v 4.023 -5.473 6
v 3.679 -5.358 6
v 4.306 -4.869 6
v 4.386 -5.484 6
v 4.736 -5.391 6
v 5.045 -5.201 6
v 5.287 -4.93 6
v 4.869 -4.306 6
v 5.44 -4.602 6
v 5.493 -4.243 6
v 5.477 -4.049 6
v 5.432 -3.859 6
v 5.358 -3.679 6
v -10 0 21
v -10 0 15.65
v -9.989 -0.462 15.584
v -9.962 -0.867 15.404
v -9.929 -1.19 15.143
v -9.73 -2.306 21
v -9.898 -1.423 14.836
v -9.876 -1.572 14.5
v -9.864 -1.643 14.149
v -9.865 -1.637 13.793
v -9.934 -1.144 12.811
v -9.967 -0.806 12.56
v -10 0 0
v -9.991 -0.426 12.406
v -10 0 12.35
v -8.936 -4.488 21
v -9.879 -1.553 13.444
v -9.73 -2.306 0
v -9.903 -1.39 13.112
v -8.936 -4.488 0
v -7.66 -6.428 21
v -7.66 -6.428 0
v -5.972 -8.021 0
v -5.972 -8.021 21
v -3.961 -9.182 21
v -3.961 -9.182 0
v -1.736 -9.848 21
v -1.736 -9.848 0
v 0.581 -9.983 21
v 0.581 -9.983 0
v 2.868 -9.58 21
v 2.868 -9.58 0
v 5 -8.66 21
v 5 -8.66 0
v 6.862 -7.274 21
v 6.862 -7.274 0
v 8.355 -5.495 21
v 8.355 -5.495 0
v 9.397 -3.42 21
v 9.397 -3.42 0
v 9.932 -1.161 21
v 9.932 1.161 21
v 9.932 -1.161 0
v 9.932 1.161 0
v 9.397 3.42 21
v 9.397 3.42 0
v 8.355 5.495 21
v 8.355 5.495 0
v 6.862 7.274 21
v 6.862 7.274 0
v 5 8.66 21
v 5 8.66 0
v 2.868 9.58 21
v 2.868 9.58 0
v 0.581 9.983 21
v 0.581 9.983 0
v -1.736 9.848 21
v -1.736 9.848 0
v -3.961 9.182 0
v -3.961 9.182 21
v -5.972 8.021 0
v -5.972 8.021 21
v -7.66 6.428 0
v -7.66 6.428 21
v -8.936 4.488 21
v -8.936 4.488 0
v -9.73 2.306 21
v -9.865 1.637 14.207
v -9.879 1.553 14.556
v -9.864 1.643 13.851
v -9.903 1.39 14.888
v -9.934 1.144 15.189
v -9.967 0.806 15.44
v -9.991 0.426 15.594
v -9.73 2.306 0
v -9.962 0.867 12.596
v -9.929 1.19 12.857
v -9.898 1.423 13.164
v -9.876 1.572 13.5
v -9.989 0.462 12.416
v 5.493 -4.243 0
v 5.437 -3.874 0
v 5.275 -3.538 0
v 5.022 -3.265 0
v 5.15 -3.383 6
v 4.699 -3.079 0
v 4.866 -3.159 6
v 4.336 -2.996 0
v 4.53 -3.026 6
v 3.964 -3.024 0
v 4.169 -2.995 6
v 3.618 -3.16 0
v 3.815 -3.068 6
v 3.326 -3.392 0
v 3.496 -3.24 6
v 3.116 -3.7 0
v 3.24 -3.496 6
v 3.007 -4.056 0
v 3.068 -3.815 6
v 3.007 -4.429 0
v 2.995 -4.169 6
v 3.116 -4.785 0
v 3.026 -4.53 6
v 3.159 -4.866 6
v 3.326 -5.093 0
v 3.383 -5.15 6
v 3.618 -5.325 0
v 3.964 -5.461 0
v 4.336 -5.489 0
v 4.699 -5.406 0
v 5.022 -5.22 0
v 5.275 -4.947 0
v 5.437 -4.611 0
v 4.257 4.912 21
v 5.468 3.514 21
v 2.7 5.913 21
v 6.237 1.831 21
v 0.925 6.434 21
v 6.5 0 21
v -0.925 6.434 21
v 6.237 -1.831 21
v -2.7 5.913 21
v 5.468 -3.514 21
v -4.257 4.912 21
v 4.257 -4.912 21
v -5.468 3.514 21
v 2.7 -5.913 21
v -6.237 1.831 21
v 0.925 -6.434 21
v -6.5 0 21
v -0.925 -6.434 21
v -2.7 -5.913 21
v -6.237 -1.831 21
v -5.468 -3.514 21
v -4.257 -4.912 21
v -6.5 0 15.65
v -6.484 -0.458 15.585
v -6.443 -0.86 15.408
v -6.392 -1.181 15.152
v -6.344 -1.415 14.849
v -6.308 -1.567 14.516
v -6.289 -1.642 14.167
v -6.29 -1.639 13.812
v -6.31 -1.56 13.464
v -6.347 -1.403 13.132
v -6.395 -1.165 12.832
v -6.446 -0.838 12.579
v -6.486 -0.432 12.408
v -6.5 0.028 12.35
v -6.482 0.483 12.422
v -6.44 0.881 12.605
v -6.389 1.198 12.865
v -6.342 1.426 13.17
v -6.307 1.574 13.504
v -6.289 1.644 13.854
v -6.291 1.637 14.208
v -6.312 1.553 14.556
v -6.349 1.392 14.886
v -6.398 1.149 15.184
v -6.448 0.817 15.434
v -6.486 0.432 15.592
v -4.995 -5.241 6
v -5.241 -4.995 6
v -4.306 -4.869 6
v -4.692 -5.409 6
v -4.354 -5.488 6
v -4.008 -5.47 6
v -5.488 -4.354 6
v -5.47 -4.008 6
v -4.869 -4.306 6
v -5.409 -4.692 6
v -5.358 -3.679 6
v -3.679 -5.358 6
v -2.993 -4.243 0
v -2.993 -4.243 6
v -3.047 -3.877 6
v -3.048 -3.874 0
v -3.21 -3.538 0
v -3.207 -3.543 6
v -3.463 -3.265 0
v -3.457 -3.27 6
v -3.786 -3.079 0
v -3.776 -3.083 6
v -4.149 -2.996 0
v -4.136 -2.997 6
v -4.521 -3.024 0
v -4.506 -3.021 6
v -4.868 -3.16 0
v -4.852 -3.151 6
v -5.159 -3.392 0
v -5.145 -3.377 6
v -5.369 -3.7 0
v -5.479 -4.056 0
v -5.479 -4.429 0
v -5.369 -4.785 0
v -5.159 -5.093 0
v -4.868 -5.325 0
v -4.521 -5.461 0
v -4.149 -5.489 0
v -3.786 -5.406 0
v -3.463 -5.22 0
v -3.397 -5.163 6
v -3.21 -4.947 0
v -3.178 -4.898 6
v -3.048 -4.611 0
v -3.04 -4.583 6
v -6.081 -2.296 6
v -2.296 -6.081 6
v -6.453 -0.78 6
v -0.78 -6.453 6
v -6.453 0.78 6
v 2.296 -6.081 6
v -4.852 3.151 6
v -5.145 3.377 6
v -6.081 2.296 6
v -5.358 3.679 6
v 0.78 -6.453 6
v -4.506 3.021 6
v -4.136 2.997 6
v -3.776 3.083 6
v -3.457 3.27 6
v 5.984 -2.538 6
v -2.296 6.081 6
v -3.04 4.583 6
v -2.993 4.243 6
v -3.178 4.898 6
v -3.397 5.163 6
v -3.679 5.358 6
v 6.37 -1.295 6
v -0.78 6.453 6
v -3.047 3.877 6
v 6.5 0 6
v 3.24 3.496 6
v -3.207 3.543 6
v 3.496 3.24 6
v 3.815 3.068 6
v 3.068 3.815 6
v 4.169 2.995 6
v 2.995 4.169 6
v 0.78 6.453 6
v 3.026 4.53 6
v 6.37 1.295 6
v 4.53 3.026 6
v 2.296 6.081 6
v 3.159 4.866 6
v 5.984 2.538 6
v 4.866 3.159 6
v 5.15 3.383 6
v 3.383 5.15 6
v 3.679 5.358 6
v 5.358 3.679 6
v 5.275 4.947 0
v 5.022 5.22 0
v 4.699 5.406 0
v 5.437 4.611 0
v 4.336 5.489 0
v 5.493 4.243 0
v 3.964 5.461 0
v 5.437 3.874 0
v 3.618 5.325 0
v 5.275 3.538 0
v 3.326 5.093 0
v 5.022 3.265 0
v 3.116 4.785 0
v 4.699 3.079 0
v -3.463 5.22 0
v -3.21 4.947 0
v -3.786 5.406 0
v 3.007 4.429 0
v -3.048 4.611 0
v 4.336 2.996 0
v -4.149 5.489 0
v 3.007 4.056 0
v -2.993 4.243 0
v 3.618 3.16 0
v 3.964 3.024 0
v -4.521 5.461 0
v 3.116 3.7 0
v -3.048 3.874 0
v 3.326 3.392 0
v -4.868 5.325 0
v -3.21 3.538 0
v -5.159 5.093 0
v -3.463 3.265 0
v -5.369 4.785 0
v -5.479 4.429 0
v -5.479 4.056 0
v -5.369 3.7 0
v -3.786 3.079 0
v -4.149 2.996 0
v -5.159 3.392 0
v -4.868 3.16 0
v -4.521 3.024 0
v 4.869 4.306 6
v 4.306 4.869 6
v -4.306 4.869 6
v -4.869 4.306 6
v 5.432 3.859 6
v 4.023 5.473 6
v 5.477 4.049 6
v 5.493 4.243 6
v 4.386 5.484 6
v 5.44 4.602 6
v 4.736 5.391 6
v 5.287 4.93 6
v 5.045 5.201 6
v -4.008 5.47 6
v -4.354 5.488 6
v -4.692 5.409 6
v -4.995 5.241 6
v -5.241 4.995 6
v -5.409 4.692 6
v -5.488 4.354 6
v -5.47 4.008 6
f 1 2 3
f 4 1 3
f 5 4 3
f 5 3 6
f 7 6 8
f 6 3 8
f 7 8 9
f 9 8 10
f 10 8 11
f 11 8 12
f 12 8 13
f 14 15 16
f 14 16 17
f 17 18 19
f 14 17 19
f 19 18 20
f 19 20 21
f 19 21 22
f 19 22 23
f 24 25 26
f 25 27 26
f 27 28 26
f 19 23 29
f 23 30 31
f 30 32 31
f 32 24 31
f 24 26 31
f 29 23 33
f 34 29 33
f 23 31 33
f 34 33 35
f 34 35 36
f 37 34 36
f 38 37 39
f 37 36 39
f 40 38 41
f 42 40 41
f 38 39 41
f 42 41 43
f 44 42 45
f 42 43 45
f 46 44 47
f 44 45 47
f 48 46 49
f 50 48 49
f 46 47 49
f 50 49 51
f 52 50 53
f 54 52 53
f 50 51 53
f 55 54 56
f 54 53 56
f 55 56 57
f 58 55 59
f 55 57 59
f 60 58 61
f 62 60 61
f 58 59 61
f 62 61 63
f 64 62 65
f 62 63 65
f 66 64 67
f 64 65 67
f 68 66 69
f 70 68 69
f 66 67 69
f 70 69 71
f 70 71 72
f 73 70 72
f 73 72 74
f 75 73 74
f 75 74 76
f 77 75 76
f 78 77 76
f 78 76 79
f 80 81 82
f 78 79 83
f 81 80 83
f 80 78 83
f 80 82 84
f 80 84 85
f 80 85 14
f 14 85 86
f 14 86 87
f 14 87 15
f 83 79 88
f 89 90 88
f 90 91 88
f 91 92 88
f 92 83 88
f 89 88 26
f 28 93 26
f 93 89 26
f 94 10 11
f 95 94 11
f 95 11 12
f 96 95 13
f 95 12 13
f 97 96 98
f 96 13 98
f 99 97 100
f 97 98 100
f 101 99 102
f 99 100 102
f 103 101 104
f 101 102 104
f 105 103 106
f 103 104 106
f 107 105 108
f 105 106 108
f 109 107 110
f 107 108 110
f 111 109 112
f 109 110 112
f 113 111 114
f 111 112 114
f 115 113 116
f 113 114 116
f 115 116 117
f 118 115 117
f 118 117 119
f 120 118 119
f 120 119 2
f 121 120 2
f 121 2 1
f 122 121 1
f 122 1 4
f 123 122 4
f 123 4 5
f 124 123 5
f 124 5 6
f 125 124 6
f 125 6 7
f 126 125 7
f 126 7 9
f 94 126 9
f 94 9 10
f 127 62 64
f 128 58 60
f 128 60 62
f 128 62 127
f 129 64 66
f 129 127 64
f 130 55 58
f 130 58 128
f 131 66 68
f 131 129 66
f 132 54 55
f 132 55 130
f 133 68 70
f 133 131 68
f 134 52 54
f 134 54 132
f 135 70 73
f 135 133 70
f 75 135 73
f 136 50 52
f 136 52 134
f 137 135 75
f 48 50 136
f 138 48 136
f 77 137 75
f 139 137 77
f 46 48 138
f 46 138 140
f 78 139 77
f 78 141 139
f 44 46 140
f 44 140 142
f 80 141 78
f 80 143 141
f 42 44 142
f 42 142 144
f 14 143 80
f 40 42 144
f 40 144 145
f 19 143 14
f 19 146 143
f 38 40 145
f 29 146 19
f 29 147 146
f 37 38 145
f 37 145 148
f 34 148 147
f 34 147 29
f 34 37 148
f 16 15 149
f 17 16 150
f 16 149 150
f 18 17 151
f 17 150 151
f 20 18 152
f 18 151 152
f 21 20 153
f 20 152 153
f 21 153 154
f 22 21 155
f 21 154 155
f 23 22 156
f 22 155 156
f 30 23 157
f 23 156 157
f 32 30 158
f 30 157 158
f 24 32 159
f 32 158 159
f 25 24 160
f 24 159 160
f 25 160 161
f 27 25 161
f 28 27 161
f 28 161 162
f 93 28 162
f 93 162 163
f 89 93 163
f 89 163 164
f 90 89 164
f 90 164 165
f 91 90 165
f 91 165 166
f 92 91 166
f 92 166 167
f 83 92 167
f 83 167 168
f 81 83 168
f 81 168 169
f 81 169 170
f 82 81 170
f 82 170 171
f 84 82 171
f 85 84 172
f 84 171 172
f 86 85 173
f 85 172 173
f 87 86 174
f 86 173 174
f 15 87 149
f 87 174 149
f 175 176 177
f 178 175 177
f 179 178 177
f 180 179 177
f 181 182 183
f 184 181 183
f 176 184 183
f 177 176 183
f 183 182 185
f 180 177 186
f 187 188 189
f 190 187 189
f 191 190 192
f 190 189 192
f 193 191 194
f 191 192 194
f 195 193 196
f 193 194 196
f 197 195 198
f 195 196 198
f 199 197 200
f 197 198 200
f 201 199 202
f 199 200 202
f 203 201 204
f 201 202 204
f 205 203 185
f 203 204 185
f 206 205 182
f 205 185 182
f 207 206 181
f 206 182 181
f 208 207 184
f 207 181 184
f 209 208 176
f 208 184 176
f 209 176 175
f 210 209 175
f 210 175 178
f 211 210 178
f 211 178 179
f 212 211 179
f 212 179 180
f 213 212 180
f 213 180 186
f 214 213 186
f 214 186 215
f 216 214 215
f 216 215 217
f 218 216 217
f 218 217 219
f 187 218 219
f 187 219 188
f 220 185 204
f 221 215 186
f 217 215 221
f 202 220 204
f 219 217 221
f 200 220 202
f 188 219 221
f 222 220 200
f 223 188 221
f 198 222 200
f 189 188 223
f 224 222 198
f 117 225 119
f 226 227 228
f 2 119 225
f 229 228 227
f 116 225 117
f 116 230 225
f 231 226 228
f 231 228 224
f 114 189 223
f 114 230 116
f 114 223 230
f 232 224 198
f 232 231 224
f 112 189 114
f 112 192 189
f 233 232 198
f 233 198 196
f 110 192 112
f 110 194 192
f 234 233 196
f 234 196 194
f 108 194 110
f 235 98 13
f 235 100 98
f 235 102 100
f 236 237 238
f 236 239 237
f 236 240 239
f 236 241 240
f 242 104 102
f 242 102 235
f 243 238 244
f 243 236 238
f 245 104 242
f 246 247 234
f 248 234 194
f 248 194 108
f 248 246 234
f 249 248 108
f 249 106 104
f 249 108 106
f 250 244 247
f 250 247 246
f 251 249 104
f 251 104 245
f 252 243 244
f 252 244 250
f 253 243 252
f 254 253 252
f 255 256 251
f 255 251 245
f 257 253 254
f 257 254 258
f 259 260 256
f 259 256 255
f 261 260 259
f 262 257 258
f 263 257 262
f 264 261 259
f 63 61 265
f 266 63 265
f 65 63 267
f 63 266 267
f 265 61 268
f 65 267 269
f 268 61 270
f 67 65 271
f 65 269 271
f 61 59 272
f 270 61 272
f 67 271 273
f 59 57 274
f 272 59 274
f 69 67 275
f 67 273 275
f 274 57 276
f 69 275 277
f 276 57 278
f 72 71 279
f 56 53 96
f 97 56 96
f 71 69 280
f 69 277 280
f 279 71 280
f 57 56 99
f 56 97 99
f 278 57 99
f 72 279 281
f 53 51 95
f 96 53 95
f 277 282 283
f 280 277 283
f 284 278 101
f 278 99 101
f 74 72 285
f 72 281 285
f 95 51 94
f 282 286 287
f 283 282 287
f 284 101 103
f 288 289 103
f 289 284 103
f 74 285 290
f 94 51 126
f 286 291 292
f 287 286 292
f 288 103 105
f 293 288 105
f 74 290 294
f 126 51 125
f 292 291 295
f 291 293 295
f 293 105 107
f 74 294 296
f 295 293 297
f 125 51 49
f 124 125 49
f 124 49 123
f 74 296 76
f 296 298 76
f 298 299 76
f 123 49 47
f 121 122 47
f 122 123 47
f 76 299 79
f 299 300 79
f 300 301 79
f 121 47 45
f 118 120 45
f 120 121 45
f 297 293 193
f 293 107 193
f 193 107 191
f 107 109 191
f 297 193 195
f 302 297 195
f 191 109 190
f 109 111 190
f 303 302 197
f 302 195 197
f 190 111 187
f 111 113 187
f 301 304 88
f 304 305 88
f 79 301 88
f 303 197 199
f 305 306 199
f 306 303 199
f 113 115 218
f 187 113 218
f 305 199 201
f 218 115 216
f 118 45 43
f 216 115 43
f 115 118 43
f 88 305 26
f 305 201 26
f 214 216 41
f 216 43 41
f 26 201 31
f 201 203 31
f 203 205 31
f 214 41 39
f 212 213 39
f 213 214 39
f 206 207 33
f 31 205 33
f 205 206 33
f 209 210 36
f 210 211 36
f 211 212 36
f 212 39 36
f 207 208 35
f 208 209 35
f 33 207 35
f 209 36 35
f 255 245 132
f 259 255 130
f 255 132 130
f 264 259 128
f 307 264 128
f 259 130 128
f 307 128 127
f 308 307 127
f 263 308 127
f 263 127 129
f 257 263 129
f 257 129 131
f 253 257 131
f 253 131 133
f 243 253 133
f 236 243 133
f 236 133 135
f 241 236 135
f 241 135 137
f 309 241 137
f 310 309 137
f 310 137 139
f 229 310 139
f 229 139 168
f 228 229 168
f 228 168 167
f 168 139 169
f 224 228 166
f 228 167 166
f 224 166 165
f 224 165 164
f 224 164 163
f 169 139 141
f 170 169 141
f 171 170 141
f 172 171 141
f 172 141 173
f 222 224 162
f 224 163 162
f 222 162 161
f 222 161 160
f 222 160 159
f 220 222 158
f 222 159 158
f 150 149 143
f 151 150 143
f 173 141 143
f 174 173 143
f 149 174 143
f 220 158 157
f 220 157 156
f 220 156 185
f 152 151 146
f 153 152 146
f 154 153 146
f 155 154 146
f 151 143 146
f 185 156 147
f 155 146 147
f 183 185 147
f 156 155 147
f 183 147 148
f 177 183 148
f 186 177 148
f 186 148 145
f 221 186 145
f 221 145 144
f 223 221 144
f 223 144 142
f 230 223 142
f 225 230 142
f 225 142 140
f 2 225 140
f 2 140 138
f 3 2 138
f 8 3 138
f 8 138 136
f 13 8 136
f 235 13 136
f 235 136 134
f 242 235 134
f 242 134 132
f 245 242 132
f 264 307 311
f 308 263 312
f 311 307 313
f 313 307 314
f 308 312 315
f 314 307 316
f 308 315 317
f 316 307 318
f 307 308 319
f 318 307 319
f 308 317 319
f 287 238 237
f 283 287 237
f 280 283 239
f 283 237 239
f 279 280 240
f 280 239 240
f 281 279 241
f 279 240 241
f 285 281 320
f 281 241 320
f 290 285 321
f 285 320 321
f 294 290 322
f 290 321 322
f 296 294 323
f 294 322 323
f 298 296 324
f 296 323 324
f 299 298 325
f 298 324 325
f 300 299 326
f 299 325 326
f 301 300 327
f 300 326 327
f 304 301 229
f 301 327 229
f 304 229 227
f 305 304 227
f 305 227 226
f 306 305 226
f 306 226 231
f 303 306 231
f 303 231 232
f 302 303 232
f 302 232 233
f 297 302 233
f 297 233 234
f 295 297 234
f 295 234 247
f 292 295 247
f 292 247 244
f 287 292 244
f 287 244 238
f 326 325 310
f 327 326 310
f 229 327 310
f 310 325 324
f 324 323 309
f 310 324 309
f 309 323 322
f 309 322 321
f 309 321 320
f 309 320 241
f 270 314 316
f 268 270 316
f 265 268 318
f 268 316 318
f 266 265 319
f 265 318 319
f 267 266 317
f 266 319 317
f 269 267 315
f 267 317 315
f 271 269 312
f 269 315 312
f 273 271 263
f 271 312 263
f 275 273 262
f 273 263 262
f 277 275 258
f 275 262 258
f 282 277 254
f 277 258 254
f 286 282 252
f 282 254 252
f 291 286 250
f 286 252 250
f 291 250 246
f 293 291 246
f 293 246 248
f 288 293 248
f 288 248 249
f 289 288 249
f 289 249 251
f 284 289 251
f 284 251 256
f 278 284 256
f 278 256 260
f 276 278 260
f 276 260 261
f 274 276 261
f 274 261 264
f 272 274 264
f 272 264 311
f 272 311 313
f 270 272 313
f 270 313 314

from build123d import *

# Parameters (mm, degrees)
SKETCH_1_R          = 10
EXTRUDE_1_DEPTH     = 21
SKETCH_2_R          = 6.5
CUT_EXTRUDE_1_DEPTH = 15
M4X0_71_D           = 3.3
M4X0_71_DEPTH       = 5
M4X0_71_TIP         = 0.991420021
M3X0_51_D           = 2.5
M3X0_51_DEPTH       = 6


with BuildPart() as part:
    # Эскиз1 → Бобышка-Вытянуть1 (new body)
    with BuildSketch(Plane.XY):
        with Locations(Location((0, 0, 0), (0, 0, 180))):
            Circle(SKETCH_1_R)
    extrude(amount=EXTRUDE_1_DEPTH)

    # Эскиз2 → Вырез-Вытянуть1 (cut)
    with BuildSketch(Plane.XY.offset(21)):
        Circle(SKETCH_2_R)
    extrude(amount=-CUT_EXTRUDE_1_DEPTH, mode=Mode.SUBTRACT)

    # Отверстие обработанное метчиком M4x0.71
    with Locations(Plane(origin=(-10, 0, 0), x_dir=(0, 0, -1), z_dir=(-1, 0, 0))):
        with Locations((-14, 0)):
            Hole(M4X0_71_D / 2, depth=M4X0_71_DEPTH)
            with Locations((0, 0, -(M4X0_71_DEPTH + M4X0_71_TIP / 2))):  # 118° drill point
                Cone(0, M4X0_71_D / 2, M4X0_71_TIP, mode=Mode.SUBTRACT)

    # Отверстие обработанное метчиком M3x0.51
    with Locations(Plane(origin=(0, 0, 0), x_dir=(-1, 0, 0), z_dir=(0, 0, -1))):
        with Locations((-4.242640687, 4.242640687), (4.242640687, 4.242640687), (4.242640687, -4.242640687), (-4.242640687, -4.242640687)):
            Hole(M3X0_51_D / 2, depth=M3X0_51_DEPTH)


solid = part.part
